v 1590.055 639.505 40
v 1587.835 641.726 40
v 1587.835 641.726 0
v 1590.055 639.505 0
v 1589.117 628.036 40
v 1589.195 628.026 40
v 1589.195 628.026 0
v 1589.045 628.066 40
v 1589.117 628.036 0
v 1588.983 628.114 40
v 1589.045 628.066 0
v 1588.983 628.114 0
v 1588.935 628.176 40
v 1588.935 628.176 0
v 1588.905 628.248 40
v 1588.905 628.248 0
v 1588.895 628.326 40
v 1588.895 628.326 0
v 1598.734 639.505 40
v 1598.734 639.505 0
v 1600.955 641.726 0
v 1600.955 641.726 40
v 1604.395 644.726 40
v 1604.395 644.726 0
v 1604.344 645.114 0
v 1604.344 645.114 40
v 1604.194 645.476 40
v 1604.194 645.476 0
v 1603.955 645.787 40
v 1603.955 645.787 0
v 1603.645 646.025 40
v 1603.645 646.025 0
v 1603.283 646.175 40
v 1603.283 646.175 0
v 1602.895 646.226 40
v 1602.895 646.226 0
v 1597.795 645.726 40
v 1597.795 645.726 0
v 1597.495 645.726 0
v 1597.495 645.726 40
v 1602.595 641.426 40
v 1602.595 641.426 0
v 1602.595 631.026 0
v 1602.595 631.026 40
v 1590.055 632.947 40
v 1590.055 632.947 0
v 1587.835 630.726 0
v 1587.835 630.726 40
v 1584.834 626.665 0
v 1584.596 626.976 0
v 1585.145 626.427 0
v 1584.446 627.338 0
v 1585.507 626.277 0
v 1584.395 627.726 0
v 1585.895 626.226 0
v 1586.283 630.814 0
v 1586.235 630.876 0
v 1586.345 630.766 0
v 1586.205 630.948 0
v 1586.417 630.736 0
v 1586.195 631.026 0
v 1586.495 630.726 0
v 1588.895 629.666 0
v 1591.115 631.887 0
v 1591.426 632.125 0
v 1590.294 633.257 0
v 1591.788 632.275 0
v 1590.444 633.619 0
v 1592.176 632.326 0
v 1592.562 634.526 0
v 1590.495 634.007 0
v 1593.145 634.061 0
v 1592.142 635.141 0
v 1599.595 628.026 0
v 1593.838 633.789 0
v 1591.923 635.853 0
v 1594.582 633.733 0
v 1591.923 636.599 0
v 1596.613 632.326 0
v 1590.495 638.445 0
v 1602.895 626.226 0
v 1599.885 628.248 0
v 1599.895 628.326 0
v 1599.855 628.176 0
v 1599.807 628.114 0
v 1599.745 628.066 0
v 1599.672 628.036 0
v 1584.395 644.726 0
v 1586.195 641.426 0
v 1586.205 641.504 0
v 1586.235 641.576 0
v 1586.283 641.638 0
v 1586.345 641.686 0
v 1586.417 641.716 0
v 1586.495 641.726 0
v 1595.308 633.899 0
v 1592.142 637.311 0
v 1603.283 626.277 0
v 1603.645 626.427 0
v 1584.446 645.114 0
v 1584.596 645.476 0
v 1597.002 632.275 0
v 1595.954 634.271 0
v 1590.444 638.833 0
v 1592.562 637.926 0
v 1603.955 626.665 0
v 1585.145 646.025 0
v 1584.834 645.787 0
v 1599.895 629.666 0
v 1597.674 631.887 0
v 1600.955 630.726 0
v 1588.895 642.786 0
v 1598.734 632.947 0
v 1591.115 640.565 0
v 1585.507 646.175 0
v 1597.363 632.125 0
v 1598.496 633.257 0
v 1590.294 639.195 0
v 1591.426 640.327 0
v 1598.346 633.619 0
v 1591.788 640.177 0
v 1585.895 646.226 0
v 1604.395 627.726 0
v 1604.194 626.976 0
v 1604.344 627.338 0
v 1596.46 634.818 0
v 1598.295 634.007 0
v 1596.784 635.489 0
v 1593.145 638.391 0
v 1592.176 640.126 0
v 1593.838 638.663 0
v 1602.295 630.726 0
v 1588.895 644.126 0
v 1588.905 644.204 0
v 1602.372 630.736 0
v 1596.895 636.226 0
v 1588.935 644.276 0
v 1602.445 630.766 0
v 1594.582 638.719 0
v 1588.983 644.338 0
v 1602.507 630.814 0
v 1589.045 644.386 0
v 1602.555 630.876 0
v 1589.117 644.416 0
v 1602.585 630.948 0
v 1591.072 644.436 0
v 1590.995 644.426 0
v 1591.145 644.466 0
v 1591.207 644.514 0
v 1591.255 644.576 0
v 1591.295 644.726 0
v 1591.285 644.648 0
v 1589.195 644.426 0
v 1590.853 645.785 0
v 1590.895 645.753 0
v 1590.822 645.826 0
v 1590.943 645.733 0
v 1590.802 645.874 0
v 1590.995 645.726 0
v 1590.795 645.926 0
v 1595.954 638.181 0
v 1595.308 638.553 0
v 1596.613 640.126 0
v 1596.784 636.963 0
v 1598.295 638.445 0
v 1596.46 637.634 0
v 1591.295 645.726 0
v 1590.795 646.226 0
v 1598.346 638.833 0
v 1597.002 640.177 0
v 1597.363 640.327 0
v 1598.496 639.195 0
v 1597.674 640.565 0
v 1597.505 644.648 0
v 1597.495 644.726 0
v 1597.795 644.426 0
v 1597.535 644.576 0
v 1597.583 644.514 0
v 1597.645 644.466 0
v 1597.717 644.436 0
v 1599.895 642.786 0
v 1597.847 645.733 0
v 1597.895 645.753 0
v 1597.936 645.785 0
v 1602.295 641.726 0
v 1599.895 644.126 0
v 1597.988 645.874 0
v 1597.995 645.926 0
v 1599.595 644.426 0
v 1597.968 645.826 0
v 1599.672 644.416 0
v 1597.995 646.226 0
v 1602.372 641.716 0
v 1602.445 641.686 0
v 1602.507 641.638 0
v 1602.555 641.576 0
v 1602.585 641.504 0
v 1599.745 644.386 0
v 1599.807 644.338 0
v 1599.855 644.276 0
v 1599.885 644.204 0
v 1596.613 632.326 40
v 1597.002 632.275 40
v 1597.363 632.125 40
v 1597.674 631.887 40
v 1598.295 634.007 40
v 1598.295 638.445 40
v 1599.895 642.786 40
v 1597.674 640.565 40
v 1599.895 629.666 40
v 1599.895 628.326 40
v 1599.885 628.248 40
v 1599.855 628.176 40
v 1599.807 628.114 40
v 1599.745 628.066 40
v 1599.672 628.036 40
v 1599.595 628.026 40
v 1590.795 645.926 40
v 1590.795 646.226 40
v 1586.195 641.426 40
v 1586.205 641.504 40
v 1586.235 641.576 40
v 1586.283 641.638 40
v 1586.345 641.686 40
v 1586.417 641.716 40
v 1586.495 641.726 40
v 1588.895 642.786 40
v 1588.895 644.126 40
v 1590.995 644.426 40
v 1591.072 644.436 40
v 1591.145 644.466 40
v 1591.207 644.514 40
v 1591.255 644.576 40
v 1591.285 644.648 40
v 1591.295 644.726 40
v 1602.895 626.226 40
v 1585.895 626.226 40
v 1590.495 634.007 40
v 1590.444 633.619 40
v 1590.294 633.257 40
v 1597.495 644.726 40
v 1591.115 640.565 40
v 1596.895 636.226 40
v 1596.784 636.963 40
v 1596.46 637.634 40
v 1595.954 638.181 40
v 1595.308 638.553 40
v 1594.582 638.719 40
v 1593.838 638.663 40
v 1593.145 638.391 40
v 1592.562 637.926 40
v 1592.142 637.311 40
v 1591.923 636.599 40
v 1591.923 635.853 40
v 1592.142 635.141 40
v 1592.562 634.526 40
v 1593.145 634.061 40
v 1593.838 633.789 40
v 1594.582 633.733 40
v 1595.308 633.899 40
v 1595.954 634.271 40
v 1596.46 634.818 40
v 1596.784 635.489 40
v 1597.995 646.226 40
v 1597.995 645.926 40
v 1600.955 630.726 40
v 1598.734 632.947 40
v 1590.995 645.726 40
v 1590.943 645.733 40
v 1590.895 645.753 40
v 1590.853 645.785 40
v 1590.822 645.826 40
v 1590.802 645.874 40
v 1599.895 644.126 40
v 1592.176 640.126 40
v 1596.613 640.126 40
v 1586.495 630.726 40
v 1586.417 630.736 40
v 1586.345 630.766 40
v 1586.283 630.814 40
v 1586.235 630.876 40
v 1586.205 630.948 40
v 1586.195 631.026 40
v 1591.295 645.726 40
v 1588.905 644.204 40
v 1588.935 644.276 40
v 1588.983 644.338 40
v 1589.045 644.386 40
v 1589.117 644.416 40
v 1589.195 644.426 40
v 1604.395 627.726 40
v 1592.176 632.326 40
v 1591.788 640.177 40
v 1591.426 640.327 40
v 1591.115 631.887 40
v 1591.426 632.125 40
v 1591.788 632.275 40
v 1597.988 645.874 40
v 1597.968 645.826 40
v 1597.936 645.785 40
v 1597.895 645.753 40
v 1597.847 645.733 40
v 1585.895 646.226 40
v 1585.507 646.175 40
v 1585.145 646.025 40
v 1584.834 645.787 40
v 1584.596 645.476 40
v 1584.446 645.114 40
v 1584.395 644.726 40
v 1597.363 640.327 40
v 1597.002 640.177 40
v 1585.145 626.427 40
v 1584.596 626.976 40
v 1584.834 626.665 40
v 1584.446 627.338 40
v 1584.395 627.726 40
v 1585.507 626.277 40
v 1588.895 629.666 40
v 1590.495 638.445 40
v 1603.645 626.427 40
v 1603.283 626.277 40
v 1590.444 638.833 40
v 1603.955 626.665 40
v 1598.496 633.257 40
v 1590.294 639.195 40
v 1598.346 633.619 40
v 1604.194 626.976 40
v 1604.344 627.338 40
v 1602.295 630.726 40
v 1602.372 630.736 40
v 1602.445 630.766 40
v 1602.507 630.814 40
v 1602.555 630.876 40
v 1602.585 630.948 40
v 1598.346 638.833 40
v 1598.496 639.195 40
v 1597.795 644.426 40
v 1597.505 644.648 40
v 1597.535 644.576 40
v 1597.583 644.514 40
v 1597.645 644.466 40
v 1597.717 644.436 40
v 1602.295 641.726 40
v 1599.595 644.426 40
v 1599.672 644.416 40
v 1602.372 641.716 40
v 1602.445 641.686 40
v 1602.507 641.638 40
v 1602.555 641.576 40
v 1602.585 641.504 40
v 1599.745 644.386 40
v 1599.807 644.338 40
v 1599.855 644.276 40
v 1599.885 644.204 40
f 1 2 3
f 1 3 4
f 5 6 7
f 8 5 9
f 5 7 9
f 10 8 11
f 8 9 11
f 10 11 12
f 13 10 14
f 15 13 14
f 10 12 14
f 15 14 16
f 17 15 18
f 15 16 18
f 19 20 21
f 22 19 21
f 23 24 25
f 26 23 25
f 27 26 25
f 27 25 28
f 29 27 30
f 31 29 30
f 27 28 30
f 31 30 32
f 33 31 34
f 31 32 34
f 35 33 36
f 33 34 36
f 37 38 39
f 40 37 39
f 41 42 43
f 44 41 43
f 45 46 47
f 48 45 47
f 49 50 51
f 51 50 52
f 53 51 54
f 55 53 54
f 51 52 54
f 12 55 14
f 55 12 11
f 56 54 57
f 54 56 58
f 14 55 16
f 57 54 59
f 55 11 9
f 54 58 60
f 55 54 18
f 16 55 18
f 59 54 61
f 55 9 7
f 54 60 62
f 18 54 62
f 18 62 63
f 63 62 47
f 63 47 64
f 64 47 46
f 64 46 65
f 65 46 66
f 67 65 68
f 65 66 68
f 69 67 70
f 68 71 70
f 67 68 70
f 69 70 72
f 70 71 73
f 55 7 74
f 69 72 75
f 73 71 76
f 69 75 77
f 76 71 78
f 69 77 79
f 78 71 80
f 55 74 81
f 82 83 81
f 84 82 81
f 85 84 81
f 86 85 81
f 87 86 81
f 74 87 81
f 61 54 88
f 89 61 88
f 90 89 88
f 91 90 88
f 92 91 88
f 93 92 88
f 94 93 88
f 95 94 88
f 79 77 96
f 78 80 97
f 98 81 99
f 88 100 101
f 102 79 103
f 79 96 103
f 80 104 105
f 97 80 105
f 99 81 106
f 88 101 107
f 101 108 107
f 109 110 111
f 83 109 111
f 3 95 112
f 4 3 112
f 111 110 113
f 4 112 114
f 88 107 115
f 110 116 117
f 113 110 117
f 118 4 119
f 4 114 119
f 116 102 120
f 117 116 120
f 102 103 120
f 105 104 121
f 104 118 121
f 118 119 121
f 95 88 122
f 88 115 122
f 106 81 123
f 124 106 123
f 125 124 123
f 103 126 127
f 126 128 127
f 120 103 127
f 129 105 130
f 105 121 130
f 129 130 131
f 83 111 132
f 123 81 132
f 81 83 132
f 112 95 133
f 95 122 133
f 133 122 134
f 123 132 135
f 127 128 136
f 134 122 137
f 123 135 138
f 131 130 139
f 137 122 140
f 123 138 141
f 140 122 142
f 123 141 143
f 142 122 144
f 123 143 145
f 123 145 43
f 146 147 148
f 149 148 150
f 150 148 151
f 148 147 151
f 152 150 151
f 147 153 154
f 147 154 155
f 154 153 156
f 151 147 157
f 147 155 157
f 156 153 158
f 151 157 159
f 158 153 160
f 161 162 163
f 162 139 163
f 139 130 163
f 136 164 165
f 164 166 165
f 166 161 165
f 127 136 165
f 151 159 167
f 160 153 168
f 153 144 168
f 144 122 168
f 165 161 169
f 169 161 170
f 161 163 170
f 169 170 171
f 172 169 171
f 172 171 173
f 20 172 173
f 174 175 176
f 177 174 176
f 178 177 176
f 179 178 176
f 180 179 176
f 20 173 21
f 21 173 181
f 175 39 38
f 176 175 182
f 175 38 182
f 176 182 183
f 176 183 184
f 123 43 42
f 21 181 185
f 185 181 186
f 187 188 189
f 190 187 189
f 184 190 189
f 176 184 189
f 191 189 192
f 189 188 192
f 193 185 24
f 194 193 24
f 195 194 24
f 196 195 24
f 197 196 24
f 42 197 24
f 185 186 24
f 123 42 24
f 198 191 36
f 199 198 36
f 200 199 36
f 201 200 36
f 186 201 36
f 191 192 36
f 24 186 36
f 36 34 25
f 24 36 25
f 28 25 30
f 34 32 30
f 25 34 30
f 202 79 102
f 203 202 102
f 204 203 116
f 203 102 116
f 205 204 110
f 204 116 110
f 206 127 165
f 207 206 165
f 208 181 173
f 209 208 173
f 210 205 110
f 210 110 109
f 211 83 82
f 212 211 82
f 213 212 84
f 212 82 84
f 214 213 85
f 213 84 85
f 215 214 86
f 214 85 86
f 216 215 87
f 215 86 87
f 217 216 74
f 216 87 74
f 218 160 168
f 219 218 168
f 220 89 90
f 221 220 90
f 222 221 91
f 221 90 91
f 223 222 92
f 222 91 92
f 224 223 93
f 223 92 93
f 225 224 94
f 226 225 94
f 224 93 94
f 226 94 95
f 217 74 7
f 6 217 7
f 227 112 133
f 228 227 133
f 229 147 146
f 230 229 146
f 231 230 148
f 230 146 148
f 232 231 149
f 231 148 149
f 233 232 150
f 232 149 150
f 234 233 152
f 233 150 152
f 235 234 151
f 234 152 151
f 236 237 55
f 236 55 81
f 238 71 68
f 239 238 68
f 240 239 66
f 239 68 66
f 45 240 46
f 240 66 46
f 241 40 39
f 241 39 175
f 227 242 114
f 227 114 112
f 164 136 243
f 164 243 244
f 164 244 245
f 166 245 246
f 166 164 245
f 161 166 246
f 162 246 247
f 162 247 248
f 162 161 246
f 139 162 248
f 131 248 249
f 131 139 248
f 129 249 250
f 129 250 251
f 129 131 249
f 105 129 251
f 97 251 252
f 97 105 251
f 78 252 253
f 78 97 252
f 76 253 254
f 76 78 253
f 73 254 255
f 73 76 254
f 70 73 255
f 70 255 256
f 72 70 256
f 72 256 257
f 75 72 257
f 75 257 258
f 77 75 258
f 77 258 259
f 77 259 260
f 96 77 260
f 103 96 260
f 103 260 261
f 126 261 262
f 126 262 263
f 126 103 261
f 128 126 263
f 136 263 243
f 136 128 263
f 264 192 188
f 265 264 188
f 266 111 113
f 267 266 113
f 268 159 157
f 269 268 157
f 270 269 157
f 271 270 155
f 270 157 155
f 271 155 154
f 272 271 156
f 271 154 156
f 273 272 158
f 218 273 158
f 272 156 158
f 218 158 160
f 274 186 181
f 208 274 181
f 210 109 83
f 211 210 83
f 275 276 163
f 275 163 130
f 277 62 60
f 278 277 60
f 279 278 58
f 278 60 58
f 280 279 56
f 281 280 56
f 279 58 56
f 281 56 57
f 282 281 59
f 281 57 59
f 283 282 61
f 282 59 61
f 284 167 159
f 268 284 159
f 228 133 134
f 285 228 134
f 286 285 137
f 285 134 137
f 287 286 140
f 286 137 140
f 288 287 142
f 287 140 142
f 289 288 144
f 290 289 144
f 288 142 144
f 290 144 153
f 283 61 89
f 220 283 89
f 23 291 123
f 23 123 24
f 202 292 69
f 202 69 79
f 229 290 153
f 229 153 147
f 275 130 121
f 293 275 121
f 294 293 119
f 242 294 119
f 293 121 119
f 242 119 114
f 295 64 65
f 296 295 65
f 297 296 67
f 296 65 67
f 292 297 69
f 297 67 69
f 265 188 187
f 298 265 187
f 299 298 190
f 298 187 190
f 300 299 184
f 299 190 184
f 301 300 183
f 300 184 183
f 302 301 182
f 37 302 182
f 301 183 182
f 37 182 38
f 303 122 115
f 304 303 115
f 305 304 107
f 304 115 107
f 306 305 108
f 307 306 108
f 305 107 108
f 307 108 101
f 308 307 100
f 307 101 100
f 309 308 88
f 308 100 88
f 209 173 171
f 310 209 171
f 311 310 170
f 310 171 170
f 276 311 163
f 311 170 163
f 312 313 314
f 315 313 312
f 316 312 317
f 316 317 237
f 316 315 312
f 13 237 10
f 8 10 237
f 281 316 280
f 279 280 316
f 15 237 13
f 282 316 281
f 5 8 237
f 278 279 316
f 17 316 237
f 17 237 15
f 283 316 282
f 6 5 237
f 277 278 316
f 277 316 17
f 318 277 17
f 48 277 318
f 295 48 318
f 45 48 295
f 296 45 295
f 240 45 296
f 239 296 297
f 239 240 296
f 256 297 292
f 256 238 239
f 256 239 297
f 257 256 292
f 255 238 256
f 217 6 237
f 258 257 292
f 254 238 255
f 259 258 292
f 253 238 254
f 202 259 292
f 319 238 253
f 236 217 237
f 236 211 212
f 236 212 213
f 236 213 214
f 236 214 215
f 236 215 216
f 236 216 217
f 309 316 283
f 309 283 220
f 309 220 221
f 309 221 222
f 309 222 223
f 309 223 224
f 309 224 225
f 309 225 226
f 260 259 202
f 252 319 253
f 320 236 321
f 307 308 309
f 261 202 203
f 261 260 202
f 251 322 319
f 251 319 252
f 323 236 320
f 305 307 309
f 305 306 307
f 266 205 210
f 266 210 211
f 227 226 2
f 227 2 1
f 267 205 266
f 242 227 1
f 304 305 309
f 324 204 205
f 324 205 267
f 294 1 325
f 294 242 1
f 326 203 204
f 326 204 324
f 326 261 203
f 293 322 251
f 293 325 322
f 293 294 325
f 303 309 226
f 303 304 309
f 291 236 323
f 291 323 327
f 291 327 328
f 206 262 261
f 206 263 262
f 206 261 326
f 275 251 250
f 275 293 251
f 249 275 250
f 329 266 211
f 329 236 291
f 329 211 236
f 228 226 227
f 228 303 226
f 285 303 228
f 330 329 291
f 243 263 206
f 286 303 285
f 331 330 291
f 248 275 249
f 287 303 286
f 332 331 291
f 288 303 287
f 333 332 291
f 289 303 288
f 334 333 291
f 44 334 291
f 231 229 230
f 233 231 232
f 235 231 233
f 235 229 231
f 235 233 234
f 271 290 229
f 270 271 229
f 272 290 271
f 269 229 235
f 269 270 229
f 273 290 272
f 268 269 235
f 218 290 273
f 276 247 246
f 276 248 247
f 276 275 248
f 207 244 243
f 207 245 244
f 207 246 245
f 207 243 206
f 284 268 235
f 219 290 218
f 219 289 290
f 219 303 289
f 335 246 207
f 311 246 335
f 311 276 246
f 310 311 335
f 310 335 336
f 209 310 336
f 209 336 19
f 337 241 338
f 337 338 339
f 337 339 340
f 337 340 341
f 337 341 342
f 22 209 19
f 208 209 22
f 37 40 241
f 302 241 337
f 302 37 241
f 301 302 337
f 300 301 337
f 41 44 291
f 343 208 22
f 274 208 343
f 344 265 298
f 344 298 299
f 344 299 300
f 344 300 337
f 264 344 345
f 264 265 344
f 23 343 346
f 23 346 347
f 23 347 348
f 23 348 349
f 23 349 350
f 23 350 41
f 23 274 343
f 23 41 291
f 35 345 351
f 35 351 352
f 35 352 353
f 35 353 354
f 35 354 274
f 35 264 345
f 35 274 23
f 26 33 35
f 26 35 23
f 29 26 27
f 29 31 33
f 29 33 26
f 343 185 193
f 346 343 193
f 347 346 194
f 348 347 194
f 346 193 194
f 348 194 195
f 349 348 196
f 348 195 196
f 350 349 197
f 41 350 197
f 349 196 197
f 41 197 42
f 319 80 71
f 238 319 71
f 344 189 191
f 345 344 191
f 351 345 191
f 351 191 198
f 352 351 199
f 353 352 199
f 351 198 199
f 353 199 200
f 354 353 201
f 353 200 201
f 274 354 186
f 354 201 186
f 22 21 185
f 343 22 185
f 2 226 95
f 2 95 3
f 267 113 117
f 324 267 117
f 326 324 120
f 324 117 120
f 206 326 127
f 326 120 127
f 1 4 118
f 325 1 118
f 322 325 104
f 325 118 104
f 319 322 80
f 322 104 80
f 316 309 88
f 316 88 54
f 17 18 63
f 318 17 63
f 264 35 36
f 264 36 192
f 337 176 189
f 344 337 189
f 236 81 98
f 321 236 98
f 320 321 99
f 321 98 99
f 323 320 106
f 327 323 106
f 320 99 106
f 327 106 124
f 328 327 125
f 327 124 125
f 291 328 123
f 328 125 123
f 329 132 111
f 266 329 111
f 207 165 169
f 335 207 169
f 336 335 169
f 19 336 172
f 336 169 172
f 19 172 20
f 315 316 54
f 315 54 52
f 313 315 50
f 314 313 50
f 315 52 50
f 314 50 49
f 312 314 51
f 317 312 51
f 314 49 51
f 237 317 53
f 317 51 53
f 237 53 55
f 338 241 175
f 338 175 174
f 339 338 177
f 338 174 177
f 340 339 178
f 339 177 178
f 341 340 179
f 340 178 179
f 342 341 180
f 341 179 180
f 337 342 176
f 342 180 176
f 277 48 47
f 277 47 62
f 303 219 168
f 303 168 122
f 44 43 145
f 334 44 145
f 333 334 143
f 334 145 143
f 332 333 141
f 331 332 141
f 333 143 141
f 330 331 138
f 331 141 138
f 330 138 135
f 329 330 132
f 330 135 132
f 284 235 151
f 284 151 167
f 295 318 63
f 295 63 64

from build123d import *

# Parameters (mm, degrees)
SKETCH_1_R      = 2.5
EXTRUDE_1_DEPTH = 40


with BuildPart() as part:
    # 草图1 → 凸台-拉伸1 (new body)
    with BuildSketch(Plane.XY):
        with BuildLine():
            Line((1604.394788332, 627.726005938), (1604.394788332, 644.726005938))
            ThreePointArc((1604.394788332, 644.726005938), (1603.955448504, 645.78666611), (1602.894788332, 646.226005938))
            Line((1602.894788332, 646.226005938), (1597.994788332, 646.226005938))
            Line((1597.994788332, 646.226005938), (1597.994788332, 645.926005938))
            ThreePointArc((1597.994788332, 645.926005938), (1597.936209689, 645.784584582), (1597.794788332, 645.726005938))
            Line((1597.794788332, 645.726005938), (1597.494788332, 645.726005938))
            Line((1597.494788332, 645.726005938), (1597.494788332, 644.726005938))
            ThreePointArc((1597.494788332, 644.726005938), (1597.582656298, 644.513873904), (1597.794788332, 644.426005938))
            Line((1597.794788332, 644.426005938), (1599.594788332, 644.426005938))
            ThreePointArc((1599.594788332, 644.426005938), (1599.806920367, 644.338137973), (1599.894788332, 644.126005938))
            Line((1599.894788332, 644.126005938), (1599.894788332, 642.786005938))
            Line((1599.894788332, 642.786005938), (1597.674128161, 640.565345767))
            ThreePointArc((1597.674128161, 640.565345767), (1597.187493137, 640.24018664), (1596.613467989, 640.126005938))
            Line((1596.613467989, 640.126005938), (1592.176108676, 640.126005938))
            ThreePointArc((1592.176108676, 640.126005938), (1591.602083527, 640.24018664), (1591.115448504, 640.565345767))
            Line((1591.115448504, 640.565345767), (1588.894788332, 642.786005938))
            Line((1588.894788332, 642.786005938), (1588.894788332, 644.126005938))
            ThreePointArc((1588.894788332, 644.126005938), (1588.982656298, 644.338137973), (1589.194788332, 644.426005938))
            Line((1589.194788332, 644.426005938), (1590.994788332, 644.426005938))
            ThreePointArc((1590.994788332, 644.426005938), (1591.206920367, 644.513873904), (1591.294788332, 644.726005938))
            Line((1591.294788332, 644.726005938), (1591.294788332, 645.726005938))
            Line((1591.294788332, 645.726005938), (1590.994788332, 645.726005938))
            ThreePointArc((1590.994788332, 645.726005938), (1590.853366976, 645.784584582), (1590.794788332, 645.926005938))
            Line((1590.794788332, 645.926005938), (1590.794788332, 646.226005938))
            Line((1590.794788332, 646.226005938), (1585.894788332, 646.226005938))
            ThreePointArc((1585.894788332, 646.226005938), (1584.834128161, 645.78666611), (1584.394788332, 644.726005938))
            Line((1584.394788332, 644.726005938), (1584.394788332, 627.726005938))
            ThreePointArc((1584.394788332, 627.726005938), (1584.834128161, 626.665345767), (1585.894788332, 626.226005938))
            Line((1585.894788332, 626.226005938), (1602.894788332, 626.226005938))
            ThreePointArc((1602.894788332, 626.226005938), (1603.955448504, 626.665345767), (1604.394788332, 627.726005938))
        make_face()
        with Locations((1594.394788332, 636.226005938)):
            Circle(SKETCH_1_R, mode=Mode.SUBTRACT)
        with BuildLine():
            Line((1598.734128161, 639.505345767), (1600.954788332, 641.726005938))
            Line((1600.954788332, 641.726005938), (1602.294788332, 641.726005938))
            ThreePointArc((1602.294788332, 641.726005938), (1602.506920367, 641.638137973), (1602.594788332, 641.426005938))
            Line((1602.594788332, 641.426005938), (1602.594788332, 631.026005938))
            ThreePointArc((1602.594788332, 631.026005938), (1602.506920367, 630.813873904), (1602.294788332, 630.726005938))
            Line((1602.294788332, 630.726005938), (1600.954788332, 630.726005938))
            Line((1600.954788332, 630.726005938), (1598.734128161, 632.94666611))
            ThreePointArc((1598.734128161, 632.94666611), (1598.408969034, 633.433301133), (1598.294788332, 634.007326282))
            Line((1598.294788332, 634.007326282), (1598.294788332, 638.444685595))
            ThreePointArc((1598.294788332, 638.444685595), (1598.408969034, 639.018710743), (1598.734128161, 639.505345767))
        make_face(mode=Mode.SUBTRACT)
        with BuildLine():
            Line((1586.194788332, 631.026005938), (1586.194788332, 641.426005938))
            ThreePointArc((1586.194788332, 641.426005938), (1586.282656298, 641.638137973), (1586.494788332, 641.726005938))
            Line((1586.494788332, 641.726005938), (1587.834788332, 641.726005938))
            Line((1587.834788332, 641.726005938), (1590.055448504, 639.505345767))
            ThreePointArc((1590.055448504, 639.505345767), (1590.380607631, 639.018710743), (1590.494788332, 638.444685595))
            Line((1590.494788332, 638.444685595), (1590.494788332, 634.007326282))
            ThreePointArc((1590.494788332, 634.007326282), (1590.380607631, 633.433301133), (1590.055448504, 632.94666611))
            Line((1590.055448504, 632.94666611), (1587.834788332, 630.726005938))
            Line((1587.834788332, 630.726005938), (1586.494788332, 630.726005938))
            ThreePointArc((1586.494788332, 630.726005938), (1586.282656298, 630.813873904), (1586.194788332, 631.026005938))
        make_face(mode=Mode.SUBTRACT)
        with BuildLine():
            Line((1599.594788332, 628.026005938), (1589.194788332, 628.026005938))
            ThreePointArc((1589.194788332, 628.026005938), (1588.982656298, 628.113873904), (1588.894788332, 628.326005938))
            Line((1588.894788332, 628.326005938), (1588.894788332, 629.666005938))
            Line((1588.894788332, 629.666005938), (1591.115448504, 631.88666611))
            ThreePointArc((1591.115448504, 631.88666611), (1591.602083527, 632.211825237), (1592.176108676, 632.326005938))
            Line((1592.176108676, 632.326005938), (1596.613467989, 632.326005938))
            ThreePointArc((1596.613467989, 632.326005938), (1597.187493137, 632.211825237), (1597.674128161, 631.88666611))
            Line((1597.674128161, 631.88666611), (1599.894788332, 629.666005938))
            Line((1599.894788332, 629.666005938), (1599.894788332, 628.326005938))
            ThreePointArc((1599.894788332, 628.326005938), (1599.806920367, 628.113873904), (1599.594788332, 628.026005938))
        make_face(mode=Mode.SUBTRACT)
    extrude(amount=EXTRUDE_1_DEPTH)


solid = part.part
